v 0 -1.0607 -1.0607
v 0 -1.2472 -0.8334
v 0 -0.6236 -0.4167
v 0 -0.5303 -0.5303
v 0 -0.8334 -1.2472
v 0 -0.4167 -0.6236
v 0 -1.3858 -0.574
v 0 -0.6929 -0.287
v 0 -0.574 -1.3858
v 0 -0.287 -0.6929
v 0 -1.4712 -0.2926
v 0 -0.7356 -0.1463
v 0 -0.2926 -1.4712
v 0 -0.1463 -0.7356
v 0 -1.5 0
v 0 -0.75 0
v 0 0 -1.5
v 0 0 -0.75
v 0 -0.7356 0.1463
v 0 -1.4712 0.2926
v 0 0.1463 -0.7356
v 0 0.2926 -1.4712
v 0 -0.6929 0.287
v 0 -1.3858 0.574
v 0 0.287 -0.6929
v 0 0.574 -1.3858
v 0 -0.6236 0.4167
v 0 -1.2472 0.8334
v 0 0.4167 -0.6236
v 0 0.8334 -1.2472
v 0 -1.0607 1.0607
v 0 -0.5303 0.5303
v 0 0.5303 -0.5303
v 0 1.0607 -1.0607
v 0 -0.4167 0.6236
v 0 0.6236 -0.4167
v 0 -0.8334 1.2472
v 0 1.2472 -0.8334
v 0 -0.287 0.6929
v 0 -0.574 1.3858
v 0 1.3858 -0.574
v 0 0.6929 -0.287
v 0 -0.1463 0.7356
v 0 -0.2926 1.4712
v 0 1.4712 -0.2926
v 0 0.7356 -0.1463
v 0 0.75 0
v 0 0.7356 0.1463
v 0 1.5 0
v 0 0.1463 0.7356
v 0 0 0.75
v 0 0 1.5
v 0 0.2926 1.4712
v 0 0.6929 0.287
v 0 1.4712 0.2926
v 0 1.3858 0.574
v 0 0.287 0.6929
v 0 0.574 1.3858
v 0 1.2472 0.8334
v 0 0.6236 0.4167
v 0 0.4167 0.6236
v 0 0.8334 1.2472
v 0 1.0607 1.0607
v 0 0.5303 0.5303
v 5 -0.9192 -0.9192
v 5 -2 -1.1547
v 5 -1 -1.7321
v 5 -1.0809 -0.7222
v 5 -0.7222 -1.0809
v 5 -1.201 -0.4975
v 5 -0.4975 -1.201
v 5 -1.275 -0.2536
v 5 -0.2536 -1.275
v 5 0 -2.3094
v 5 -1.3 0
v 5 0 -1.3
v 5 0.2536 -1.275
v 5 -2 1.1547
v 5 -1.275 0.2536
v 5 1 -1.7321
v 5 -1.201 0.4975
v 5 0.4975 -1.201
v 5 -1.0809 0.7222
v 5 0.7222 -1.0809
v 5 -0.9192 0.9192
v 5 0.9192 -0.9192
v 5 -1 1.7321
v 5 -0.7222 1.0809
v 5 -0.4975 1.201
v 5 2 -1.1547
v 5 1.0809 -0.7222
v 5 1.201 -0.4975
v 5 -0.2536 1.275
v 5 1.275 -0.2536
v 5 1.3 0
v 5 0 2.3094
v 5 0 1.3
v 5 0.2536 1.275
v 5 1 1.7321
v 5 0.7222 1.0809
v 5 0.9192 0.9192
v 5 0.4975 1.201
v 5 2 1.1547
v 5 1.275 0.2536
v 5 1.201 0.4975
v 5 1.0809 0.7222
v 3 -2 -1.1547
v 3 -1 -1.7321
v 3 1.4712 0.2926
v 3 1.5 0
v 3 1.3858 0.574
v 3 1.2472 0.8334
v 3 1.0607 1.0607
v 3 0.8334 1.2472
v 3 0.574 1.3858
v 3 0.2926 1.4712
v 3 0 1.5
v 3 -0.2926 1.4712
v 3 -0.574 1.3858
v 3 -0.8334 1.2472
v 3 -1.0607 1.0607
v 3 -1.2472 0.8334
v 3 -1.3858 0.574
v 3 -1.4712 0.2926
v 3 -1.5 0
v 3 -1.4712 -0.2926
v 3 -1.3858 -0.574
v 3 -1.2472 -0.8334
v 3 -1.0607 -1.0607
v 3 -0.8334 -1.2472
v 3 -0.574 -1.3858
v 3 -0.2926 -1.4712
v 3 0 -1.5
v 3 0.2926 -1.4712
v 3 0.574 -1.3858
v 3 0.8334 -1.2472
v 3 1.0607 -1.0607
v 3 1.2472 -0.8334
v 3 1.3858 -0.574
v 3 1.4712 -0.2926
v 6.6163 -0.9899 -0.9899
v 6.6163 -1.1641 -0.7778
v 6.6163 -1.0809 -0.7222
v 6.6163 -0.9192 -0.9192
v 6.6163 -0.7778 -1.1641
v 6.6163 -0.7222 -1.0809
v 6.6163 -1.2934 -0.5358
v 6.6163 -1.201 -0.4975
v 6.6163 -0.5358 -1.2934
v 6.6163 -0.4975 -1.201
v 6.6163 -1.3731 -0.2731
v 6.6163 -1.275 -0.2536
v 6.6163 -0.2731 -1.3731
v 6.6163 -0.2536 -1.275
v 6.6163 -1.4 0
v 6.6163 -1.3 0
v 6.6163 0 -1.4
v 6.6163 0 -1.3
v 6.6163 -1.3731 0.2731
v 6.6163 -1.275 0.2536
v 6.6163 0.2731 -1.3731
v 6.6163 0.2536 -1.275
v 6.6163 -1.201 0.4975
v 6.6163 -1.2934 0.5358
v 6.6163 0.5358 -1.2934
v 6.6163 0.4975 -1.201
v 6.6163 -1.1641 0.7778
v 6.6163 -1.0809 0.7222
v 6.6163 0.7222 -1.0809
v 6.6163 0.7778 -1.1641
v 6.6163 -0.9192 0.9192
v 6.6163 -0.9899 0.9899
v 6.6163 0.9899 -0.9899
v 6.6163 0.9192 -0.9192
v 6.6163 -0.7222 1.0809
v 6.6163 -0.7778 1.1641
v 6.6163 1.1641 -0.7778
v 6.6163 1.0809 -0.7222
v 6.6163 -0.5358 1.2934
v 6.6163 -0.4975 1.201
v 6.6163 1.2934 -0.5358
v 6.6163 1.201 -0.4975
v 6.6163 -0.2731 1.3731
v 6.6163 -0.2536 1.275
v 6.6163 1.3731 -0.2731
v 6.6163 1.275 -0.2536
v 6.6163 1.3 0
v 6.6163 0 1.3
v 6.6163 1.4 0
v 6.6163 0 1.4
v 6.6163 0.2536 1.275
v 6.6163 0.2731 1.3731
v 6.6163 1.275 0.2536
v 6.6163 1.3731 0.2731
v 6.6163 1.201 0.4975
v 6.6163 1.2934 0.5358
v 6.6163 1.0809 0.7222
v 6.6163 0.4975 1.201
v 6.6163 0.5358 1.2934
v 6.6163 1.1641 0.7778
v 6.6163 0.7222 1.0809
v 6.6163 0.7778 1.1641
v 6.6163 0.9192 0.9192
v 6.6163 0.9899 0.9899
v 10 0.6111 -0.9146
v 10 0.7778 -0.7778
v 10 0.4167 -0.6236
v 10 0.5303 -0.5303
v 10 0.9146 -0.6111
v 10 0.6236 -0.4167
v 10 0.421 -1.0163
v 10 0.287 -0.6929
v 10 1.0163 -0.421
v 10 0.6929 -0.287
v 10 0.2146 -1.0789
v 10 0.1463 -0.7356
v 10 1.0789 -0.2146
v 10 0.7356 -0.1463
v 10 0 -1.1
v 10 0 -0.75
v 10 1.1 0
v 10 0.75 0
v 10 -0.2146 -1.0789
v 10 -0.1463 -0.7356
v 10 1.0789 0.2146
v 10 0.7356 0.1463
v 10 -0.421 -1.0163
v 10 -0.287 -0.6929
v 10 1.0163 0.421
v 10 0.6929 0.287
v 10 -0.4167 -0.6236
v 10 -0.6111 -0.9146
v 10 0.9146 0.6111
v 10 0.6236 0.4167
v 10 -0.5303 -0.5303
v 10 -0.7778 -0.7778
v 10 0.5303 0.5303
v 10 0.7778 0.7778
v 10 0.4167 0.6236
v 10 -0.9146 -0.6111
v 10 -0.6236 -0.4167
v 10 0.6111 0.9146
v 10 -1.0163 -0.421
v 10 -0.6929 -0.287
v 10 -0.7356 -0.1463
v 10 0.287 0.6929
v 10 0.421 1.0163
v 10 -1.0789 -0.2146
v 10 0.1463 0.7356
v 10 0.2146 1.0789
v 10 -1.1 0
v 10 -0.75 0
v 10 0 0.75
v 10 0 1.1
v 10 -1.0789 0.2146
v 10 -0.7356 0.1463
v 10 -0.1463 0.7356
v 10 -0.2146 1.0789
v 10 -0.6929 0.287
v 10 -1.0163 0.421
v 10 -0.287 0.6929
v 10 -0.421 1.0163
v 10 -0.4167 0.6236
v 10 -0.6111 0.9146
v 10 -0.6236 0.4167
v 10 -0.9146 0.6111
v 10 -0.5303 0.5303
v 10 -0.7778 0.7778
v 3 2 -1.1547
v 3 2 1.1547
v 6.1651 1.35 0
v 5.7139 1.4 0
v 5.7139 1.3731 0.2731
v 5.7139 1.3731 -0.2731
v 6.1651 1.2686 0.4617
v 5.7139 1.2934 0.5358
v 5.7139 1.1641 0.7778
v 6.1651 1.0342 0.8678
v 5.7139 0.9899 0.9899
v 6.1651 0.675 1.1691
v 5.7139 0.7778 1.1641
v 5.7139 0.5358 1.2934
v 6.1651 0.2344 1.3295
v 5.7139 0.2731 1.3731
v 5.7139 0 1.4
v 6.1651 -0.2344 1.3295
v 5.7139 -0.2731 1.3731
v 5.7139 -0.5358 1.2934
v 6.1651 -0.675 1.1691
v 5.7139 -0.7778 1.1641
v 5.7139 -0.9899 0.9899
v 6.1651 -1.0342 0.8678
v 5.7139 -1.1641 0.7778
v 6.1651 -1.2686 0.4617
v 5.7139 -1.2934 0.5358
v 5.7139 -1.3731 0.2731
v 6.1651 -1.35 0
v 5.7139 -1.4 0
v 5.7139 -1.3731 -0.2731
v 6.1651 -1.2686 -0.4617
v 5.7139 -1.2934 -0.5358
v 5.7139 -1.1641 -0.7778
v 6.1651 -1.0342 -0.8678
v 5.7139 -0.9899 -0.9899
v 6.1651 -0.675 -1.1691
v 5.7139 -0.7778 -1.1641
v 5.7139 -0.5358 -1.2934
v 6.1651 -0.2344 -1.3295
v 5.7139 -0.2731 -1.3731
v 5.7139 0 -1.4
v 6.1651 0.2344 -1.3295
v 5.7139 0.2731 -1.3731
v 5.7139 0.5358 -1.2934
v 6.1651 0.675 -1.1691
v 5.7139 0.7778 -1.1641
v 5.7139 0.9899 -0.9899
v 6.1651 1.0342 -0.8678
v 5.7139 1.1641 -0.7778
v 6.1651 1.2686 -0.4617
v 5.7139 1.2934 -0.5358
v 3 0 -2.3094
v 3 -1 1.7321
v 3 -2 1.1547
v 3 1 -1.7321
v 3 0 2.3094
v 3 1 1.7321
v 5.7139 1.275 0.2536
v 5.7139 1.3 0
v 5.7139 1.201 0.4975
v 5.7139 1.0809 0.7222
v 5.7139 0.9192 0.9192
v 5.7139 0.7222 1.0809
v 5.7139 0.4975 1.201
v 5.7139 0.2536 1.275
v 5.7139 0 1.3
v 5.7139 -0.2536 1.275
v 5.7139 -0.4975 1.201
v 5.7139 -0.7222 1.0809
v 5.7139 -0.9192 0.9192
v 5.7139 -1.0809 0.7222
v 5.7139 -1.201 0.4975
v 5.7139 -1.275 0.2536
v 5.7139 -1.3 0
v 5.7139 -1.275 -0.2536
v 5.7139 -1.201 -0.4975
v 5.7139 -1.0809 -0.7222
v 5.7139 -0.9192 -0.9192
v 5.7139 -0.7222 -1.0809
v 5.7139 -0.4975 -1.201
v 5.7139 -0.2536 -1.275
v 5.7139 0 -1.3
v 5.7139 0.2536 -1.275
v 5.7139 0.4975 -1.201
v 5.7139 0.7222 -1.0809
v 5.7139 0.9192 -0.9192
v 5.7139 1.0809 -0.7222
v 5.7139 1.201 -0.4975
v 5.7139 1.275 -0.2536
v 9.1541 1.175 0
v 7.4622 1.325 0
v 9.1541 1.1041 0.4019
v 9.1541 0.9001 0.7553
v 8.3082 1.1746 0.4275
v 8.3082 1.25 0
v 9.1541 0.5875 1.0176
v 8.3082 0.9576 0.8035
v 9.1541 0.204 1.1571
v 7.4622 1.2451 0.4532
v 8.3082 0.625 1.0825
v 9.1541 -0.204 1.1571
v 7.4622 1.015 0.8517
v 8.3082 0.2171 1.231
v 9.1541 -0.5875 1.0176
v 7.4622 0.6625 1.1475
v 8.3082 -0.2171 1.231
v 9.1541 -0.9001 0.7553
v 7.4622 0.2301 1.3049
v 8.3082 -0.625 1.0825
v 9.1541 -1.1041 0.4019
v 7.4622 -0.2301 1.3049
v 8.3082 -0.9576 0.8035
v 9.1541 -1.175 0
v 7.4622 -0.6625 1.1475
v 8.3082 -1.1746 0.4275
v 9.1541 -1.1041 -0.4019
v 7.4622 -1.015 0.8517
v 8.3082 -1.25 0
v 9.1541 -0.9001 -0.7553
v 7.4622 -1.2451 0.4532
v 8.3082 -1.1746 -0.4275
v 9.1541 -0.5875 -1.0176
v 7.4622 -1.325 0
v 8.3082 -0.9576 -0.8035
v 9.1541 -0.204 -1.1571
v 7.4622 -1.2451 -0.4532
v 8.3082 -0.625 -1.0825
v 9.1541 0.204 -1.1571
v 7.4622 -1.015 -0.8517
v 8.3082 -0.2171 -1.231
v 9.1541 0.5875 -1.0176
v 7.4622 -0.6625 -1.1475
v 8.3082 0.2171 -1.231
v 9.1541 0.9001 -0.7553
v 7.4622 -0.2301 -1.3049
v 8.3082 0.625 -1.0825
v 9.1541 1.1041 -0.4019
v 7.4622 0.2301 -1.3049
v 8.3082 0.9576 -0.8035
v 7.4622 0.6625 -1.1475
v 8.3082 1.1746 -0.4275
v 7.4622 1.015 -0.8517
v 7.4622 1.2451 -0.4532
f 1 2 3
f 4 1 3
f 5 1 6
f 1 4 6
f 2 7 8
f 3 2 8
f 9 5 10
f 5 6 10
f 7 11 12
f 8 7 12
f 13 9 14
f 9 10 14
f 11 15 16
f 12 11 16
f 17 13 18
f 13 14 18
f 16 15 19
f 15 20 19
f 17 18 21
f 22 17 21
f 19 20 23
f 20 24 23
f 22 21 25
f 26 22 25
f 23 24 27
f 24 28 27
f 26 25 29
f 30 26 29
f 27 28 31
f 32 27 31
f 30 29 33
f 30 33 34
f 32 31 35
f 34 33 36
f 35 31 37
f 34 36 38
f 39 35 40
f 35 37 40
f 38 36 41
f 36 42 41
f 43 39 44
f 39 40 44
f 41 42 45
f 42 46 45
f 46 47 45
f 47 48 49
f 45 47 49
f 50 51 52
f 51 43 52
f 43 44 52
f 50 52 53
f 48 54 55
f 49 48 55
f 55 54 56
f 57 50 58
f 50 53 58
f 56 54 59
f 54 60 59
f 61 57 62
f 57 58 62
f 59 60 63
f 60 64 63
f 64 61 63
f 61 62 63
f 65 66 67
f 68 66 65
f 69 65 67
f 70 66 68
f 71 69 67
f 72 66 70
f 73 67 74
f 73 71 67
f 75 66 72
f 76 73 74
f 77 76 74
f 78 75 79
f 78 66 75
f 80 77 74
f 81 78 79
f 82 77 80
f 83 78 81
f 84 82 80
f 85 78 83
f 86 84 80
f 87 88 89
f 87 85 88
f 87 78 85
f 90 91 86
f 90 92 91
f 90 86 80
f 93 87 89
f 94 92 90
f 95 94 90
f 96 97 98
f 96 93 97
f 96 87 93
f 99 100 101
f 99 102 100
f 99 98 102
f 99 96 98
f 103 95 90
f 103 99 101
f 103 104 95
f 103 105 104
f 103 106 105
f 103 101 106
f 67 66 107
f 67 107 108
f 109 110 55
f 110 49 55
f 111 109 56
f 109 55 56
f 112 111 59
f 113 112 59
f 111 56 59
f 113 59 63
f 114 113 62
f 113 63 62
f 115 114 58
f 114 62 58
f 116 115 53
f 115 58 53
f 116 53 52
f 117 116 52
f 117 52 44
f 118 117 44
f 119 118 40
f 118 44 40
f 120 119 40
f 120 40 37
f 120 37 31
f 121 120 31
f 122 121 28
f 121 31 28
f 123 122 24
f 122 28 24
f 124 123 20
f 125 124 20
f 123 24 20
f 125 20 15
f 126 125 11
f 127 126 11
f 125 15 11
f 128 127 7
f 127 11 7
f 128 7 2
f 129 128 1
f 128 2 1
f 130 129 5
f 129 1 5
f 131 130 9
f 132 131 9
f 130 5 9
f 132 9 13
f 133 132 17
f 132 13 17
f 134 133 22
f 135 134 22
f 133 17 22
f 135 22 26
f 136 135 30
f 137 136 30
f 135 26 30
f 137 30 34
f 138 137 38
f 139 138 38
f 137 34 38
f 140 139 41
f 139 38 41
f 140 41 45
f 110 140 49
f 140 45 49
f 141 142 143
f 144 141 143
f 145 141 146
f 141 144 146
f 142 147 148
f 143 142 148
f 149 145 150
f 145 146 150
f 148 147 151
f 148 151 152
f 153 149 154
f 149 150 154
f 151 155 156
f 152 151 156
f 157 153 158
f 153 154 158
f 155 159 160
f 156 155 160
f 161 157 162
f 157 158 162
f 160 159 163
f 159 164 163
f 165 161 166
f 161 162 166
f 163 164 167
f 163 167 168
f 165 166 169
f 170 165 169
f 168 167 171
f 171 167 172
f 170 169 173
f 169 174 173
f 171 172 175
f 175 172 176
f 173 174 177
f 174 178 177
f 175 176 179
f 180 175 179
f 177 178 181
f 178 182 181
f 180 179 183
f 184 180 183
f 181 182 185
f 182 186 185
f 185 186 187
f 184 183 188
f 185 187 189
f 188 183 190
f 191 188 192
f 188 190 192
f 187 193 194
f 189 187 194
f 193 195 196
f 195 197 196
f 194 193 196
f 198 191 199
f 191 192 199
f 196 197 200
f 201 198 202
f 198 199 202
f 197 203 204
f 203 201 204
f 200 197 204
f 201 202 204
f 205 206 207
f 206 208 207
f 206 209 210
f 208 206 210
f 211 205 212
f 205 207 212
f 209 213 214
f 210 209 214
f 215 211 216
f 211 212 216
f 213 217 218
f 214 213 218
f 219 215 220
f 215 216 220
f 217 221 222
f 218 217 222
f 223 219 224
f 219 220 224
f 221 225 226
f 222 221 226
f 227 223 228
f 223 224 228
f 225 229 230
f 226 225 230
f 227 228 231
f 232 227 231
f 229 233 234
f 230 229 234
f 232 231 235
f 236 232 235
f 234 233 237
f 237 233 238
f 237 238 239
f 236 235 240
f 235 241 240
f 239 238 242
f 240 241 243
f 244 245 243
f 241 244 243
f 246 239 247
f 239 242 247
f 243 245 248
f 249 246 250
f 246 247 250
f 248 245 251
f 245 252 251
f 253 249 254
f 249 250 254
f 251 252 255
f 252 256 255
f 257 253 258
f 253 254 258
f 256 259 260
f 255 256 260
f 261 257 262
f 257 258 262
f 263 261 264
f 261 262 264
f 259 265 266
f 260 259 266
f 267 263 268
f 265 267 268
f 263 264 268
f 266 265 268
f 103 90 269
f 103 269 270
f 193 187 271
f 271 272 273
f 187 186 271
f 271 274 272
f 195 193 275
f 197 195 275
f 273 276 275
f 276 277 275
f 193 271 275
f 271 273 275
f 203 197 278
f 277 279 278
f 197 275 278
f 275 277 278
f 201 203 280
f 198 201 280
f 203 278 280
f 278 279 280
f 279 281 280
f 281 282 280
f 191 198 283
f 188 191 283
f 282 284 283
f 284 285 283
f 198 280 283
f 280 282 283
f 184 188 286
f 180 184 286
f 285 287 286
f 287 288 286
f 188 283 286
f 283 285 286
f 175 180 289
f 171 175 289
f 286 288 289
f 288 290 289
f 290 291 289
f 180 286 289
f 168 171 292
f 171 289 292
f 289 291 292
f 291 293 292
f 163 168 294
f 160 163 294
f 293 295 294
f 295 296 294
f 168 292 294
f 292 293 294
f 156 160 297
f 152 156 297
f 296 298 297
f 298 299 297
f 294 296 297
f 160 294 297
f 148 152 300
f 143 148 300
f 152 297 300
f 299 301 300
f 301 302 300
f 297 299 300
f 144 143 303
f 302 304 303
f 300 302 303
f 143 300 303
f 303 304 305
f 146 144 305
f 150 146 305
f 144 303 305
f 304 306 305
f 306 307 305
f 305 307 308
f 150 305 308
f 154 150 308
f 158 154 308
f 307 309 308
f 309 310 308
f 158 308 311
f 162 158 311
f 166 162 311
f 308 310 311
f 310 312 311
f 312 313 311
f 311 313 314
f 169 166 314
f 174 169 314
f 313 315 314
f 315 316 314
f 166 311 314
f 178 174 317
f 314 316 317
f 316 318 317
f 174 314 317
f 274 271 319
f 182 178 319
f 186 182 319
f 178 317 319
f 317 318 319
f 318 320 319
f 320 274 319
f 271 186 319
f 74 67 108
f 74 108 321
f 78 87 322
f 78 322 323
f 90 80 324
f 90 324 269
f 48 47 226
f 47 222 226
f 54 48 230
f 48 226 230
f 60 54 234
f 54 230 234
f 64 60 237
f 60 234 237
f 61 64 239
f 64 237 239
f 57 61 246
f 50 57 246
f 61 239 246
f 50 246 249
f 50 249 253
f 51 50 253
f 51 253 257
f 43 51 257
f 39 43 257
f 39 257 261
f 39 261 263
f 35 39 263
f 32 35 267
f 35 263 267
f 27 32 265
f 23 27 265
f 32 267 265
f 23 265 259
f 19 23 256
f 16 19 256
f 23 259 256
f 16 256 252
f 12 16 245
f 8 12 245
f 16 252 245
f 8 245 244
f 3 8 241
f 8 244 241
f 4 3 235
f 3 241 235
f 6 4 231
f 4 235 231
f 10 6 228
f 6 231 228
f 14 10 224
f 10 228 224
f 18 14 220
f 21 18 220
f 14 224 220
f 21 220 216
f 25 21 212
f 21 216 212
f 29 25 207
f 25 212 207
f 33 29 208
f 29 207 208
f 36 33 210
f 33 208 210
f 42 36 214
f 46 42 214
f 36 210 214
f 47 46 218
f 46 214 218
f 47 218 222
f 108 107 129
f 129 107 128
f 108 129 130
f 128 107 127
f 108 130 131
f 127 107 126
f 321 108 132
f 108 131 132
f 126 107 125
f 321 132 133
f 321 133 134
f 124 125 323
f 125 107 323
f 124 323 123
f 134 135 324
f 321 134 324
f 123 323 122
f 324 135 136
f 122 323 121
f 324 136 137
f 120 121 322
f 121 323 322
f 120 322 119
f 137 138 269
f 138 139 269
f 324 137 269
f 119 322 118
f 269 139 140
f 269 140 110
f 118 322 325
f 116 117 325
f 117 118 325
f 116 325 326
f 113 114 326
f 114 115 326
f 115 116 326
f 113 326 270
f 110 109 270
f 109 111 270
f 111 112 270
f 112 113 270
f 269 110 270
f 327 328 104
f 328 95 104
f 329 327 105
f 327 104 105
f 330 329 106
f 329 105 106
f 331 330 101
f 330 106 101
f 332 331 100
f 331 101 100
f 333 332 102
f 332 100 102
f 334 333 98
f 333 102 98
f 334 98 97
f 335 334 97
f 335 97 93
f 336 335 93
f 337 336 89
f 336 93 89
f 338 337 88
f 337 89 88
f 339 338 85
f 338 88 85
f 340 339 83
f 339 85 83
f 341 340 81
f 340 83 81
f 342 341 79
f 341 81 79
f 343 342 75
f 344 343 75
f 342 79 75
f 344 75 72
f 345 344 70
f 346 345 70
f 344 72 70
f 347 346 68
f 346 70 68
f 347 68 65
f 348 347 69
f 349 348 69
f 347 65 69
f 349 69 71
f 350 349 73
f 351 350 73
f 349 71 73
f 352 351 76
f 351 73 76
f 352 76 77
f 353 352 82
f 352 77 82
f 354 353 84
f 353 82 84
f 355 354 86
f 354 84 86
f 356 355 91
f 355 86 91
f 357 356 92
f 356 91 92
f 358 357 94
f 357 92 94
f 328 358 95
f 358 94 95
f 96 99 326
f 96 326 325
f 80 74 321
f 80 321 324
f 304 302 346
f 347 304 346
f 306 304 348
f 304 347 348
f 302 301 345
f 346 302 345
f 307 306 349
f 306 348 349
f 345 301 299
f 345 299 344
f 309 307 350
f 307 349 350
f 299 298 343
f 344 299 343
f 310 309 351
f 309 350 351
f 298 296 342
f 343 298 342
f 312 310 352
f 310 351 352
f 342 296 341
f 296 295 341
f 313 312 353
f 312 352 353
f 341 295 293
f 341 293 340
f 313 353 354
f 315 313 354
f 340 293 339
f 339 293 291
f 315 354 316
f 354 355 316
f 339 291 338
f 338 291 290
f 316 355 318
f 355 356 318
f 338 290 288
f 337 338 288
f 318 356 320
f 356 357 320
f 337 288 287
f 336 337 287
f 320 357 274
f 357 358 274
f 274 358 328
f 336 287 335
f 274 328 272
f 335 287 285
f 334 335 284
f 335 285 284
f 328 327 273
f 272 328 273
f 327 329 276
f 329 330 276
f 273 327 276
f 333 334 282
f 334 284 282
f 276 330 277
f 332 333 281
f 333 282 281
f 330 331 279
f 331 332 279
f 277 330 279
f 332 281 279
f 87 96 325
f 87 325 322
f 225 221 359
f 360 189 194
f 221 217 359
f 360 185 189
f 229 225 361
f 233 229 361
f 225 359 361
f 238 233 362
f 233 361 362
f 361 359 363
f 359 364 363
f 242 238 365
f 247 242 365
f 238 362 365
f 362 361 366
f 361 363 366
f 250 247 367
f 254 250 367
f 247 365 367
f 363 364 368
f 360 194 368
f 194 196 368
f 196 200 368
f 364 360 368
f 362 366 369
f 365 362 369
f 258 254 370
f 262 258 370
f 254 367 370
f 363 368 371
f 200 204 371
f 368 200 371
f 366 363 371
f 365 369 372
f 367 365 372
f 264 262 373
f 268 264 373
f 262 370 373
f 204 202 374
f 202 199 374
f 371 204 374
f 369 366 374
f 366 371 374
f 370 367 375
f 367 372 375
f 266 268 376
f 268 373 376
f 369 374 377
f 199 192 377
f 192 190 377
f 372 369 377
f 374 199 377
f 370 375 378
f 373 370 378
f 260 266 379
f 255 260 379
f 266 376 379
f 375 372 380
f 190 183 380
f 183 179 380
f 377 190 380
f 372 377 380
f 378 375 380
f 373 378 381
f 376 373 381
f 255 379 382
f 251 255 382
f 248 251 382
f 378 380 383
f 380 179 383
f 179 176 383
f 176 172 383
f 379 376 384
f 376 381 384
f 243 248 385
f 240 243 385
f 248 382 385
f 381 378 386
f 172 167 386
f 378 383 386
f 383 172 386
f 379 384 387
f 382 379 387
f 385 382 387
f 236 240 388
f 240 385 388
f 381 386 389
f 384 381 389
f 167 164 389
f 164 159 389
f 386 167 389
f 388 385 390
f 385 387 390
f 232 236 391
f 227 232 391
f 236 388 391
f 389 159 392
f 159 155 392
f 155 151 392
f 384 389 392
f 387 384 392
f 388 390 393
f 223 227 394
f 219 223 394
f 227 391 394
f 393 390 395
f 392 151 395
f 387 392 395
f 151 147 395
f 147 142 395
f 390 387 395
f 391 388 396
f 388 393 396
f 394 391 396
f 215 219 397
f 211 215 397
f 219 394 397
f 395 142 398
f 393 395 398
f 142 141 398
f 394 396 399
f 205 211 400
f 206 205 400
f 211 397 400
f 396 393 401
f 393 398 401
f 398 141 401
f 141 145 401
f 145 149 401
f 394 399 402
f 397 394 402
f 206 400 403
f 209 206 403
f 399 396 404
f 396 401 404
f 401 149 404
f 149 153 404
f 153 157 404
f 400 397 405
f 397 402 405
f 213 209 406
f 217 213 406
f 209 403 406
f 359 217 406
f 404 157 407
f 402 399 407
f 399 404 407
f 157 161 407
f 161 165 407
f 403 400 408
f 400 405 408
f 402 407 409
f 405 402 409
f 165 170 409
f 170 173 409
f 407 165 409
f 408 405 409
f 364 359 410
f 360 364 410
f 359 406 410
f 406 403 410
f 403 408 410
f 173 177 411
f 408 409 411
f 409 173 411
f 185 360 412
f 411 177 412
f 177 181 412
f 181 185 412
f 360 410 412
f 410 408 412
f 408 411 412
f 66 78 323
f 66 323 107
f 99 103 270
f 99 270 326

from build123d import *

# Parameters (mm, degrees)
F3_DEPTH = 2


with BuildPart() as f1:
    # F0 (on Top) → F1 (revolve)
    with BuildSketch(Plane.XY):
        Polygon((0, 1.5), (0, 0.75), (10, 0.75), (10, 1.1), (6.6163264594, 1.4), (6.6163264594, 1.3), (5.7138770835, 1.4), (5.7138770835, 1.3), (5, 1.3), (5, 2), (3, 2), (3, 1.5), align=None)
    revolve(axis=Axis((7.7490479817, 0, 0), (1, 0, 0)))

    # F2 (on face) → F3 (join)
    with BuildSketch(Plane.YZ.offset(5)):
        with BuildLine():
            Line((2, 0), (2, 1.1547005384))
            Line((2, 1.1547005384), (1.0000000433, 1.7320507826))
            ThreePointArc((1.0000000433, 1.7320507826), (1.7320508201, 0.9999999783), (2, 0))
        make_face()
        with BuildLine():
            Line((2, -1.1547005384), (2, 0))
            ThreePointArc((2, 0), (1.7320508201, -0.9999999783), (1.0000000433, -1.7320507826))
            Line((1.0000000433, -1.7320507826), (2, -1.1547005384))
        make_face()
        with BuildLine():
            ThreePointArc((-1.0000000602, 1.7320507728), (-9.7e-09, 2), (1.0000000433, 1.7320507826))
            Line((1.0000000433, 1.7320507826), (0, 2.3094010768))
            Line((0, 2.3094010768), (-1.0000000602, 1.7320507728))
        make_face()
        with BuildLine():
            Line((0, -2.3094010768), (1.0000000433, -1.7320507826))
            ThreePointArc((1.0000000433, -1.7320507826), (0, -2), (-1.0000000433, -1.7320507826))
            Line((-1.0000000433, -1.7320507826), (0, -2.3094010768))
        make_face()
        with BuildLine():
            ThreePointArc((-2, 0), (-1.7320508249, 0.9999999699), (-1.0000000602, 1.7320507728))
            Line((-1.0000000602, 1.7320507728), (-2, 1.1547005384))
            Line((-2, 1.1547005384), (-2, 0))
        make_face()
        with BuildLine():
            Line((-2, -1.1547005384), (-1.0000000433, -1.7320507826))
            ThreePointArc((-1.0000000433, -1.7320507826), (-1.7320508201, -0.9999999783), (-2, 0))
            Line((-2, 0), (-2, -1.1547005384))
        make_face()
    extrude(amount=-F3_DEPTH)


solid = f1.part
